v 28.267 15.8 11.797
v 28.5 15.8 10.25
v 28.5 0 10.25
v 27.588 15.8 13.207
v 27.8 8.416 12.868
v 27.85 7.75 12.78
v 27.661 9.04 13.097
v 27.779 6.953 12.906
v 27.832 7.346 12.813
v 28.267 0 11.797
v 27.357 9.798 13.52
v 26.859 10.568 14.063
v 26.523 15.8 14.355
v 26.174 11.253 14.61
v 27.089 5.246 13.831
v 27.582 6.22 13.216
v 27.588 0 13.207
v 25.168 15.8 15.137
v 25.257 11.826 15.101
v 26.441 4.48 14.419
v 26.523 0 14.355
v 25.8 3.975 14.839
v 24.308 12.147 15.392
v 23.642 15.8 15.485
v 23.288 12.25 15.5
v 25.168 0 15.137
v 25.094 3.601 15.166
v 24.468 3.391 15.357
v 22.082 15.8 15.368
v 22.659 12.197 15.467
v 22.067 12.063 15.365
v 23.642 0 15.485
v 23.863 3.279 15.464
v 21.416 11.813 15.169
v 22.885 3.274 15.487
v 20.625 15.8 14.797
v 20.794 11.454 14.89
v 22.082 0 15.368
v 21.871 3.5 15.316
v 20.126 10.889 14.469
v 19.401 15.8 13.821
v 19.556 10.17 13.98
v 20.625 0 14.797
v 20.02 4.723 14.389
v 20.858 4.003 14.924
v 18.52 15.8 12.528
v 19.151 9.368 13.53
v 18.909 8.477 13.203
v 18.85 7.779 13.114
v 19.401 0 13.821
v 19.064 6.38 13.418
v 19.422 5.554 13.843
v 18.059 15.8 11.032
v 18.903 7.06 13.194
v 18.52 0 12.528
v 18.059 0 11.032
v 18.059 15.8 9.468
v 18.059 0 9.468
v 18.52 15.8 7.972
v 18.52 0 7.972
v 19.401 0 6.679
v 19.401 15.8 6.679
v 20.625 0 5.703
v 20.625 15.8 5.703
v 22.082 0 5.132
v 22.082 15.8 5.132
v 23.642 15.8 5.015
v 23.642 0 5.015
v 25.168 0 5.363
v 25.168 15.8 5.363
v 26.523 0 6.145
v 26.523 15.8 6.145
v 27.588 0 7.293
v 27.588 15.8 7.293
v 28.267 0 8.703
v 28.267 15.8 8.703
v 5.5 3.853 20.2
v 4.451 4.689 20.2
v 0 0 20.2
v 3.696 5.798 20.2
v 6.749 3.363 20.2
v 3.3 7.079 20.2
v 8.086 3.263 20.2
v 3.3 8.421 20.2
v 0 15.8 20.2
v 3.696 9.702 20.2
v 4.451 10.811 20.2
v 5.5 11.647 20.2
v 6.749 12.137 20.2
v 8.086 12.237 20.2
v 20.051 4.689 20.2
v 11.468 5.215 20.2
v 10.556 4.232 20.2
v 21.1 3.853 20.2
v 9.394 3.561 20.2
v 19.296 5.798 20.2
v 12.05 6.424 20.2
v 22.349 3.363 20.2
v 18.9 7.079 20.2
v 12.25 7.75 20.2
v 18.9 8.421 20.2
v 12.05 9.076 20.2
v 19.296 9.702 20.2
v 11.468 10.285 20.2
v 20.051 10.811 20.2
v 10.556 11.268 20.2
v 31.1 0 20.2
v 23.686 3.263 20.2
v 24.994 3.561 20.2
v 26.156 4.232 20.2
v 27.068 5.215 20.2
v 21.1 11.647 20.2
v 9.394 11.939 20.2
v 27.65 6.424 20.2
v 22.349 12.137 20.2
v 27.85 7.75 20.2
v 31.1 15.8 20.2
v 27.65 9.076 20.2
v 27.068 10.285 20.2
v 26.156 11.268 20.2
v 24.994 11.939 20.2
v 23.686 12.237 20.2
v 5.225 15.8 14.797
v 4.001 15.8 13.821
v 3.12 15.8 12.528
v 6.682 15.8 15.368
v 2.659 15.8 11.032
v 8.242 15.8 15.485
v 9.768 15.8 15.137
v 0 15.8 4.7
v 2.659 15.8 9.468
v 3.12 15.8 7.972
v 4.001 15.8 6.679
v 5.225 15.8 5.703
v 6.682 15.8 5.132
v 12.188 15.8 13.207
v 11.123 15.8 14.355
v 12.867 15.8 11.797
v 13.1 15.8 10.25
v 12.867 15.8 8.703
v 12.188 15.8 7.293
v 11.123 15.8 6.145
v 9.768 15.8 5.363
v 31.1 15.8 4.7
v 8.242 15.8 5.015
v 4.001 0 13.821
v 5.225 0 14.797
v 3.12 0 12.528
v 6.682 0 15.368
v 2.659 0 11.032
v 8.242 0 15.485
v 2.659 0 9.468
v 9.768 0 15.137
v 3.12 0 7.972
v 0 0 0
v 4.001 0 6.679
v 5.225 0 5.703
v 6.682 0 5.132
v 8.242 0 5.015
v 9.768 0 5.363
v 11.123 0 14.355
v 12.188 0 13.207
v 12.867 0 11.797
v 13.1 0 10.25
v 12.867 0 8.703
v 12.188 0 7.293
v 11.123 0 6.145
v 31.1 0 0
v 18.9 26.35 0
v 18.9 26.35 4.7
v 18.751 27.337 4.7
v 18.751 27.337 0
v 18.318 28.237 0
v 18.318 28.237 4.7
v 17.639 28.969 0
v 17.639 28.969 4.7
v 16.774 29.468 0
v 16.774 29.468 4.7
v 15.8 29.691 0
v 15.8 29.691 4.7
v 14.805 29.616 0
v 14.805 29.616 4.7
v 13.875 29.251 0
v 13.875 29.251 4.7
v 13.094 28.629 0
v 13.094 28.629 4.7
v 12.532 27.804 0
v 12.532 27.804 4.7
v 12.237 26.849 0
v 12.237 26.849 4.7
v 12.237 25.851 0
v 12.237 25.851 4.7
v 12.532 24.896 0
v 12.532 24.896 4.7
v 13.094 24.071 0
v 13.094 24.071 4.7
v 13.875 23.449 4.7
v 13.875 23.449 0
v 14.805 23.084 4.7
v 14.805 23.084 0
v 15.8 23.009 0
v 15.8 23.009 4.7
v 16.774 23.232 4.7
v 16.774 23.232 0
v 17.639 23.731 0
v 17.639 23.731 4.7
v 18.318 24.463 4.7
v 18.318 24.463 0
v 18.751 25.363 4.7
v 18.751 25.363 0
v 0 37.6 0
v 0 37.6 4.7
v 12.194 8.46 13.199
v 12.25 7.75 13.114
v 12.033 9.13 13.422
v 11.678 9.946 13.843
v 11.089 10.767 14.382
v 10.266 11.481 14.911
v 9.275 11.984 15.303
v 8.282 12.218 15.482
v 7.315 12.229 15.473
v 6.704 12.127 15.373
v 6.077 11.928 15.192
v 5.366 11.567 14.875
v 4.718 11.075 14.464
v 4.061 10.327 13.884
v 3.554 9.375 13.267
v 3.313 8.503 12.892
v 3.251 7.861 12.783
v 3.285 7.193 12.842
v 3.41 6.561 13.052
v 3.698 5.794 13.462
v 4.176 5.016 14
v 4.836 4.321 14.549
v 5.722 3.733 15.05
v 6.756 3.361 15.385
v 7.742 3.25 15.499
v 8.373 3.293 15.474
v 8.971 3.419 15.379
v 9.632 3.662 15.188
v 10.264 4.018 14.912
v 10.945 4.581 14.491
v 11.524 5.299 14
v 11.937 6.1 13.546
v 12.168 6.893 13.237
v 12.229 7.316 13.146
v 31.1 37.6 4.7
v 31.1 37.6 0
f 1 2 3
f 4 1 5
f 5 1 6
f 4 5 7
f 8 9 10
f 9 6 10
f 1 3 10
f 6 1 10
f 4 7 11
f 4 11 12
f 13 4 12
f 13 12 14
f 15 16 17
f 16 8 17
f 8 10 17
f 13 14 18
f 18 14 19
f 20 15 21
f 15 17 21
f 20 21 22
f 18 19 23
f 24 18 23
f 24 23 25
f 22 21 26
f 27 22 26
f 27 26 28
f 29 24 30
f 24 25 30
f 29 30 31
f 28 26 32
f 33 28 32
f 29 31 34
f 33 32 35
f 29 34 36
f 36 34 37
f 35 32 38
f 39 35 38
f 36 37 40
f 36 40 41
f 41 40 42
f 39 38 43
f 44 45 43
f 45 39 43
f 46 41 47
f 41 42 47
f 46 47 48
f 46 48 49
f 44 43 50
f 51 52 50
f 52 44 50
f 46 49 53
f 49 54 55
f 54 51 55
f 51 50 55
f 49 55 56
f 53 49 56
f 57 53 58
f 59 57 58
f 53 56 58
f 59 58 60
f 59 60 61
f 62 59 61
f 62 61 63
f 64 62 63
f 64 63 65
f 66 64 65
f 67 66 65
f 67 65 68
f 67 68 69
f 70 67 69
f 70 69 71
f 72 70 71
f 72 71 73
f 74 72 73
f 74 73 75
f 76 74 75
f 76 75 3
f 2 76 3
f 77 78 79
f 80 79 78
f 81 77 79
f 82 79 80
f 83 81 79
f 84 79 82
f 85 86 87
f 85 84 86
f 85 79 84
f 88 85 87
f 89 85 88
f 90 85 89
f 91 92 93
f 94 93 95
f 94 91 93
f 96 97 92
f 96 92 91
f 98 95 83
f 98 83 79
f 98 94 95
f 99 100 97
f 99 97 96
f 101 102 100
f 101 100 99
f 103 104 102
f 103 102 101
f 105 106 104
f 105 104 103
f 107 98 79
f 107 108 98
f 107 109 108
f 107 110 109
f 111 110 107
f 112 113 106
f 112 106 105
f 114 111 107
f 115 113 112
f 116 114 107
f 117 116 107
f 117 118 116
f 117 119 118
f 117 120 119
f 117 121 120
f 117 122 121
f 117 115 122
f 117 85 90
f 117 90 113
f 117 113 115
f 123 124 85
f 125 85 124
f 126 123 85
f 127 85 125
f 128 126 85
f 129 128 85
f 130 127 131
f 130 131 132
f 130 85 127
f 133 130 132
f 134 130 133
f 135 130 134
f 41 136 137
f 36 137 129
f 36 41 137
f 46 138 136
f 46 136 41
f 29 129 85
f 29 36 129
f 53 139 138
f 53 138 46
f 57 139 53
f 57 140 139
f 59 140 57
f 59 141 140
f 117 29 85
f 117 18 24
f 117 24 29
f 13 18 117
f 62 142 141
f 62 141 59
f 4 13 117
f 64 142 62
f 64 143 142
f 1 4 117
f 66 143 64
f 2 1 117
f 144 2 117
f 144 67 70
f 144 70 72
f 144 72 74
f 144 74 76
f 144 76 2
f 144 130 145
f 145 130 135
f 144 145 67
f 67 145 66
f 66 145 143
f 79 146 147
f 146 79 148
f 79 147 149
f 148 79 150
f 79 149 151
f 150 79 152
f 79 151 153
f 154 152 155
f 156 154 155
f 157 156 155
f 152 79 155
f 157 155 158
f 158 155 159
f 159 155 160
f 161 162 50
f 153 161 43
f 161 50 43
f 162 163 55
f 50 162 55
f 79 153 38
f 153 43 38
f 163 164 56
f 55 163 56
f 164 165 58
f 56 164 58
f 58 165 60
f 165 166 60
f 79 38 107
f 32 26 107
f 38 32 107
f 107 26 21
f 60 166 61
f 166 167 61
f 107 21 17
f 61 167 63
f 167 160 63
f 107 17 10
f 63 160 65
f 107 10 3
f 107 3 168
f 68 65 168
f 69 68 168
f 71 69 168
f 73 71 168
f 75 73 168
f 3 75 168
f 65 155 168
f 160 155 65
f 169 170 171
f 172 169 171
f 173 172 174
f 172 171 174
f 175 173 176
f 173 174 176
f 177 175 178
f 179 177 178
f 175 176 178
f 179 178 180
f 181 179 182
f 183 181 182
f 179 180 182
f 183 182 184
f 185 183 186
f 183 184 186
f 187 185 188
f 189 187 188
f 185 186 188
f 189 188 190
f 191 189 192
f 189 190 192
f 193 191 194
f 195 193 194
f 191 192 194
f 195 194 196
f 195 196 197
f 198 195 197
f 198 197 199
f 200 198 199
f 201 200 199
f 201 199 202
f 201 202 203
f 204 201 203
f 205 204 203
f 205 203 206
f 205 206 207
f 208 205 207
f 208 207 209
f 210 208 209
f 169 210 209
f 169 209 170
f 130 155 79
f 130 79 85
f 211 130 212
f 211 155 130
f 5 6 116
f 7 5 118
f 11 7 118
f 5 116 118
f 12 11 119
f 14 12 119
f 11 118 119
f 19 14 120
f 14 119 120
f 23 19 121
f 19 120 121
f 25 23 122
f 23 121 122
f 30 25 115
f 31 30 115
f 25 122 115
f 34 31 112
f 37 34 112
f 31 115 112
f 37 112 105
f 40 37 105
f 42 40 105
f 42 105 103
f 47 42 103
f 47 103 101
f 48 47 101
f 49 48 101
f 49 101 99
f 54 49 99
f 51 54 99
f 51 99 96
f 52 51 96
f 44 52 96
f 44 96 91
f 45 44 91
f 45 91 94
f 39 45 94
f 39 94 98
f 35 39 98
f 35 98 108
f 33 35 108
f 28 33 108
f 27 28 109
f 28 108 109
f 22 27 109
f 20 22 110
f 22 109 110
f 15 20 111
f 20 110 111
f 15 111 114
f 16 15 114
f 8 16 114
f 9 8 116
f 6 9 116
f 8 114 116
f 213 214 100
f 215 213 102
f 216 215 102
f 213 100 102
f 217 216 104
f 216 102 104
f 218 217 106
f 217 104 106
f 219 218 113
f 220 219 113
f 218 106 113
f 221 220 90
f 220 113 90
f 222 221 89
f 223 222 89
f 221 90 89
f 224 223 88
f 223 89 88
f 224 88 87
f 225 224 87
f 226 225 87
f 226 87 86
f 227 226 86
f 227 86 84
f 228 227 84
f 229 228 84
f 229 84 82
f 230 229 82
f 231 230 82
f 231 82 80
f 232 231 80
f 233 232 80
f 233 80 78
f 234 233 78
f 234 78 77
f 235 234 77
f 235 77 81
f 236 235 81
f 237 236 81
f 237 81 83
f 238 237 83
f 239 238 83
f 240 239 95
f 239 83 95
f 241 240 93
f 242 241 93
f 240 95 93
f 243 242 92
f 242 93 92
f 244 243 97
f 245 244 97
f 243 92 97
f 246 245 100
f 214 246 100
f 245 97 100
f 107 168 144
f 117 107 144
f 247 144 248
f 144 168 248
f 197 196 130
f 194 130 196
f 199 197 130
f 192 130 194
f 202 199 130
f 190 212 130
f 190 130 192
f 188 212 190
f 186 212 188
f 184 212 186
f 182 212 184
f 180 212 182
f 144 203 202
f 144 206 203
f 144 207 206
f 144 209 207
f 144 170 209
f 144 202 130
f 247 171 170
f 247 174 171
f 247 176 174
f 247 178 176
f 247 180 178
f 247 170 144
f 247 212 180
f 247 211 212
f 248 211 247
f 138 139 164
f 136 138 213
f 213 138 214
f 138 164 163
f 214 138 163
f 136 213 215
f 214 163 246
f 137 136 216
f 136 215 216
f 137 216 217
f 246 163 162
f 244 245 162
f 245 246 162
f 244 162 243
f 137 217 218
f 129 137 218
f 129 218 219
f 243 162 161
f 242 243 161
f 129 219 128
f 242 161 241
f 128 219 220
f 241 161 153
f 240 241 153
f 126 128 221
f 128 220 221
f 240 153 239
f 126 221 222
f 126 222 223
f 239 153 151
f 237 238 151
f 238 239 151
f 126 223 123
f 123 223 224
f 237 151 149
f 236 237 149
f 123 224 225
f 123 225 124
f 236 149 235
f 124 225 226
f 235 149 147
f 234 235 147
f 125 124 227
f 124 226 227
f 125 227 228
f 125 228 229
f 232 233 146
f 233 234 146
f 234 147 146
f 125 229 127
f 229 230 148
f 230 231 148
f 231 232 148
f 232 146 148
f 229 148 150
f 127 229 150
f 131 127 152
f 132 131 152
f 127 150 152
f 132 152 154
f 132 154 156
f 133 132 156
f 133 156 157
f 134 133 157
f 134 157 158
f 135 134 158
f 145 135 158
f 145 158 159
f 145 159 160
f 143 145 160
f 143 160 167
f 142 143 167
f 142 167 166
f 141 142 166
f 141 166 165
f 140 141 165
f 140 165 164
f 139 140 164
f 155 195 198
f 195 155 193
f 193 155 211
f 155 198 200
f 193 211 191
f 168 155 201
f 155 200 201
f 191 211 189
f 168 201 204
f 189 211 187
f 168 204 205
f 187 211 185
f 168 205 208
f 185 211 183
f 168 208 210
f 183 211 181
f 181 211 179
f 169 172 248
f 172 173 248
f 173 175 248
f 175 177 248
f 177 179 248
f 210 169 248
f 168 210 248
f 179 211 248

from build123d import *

# Parameters (mm, degrees)
F0_W     = 31.1
F0_H     = 15.8
F1_DEPTH = 20.2
F0_H_2   = 21.8
F2_DEPTH = 4.7
F3_R     = 5.25
F4_DEPTH = 37.601
F5_R     = 3.35
F6_DEPTH = 4.701
F7_R     = 4.5
F8_DEPTH = 9


with BuildPart() as f1:
    # F0 (on Top) → F1 (new body)
    with BuildSketch(Plane.XY):
        with Locations((15.55, 7.9)):
            Rectangle(F0_W, F0_H)
    extrude(amount=F1_DEPTH)

    # F0 (on Top) → F2 (join)
    with BuildSketch(Plane.XY):
        with Locations((15.55, 7.9)):
            Rectangle(F0_W, F0_H)
        with Locations((15.55, 26.7)):
            Rectangle(F0_W, F0_H_2)
    extrude(amount=F2_DEPTH)

    # F3 (on face) → F4 (cut, through all)
    with BuildSketch(Plane.XZ):
        with Locations((7.85, 10.25)):
            Circle(F3_R)
        with Locations((23.25, 10.25)):
            Circle(F3_R)
    extrude(amount=-F4_DEPTH, mode=Mode.SUBTRACT)

    # F5 (on face) → F6 (cut, through all)
    with BuildSketch(Plane.XY.offset(4.7)):
        with Locations((15.55, 26.35)):
            Circle(F5_R)
    extrude(amount=-F6_DEPTH, mode=Mode.SUBTRACT)

    # F7 (on face) → F8 (cut)
    with BuildSketch(Plane.XY.offset(20.2)):
        with Locations((7.75, 7.75)):
            Circle(F7_R)
        with Locations((23.35, 7.75)):
            Circle(F7_R)
    extrude(amount=-F8_DEPTH, mode=Mode.SUBTRACT)


solid = f1.part
